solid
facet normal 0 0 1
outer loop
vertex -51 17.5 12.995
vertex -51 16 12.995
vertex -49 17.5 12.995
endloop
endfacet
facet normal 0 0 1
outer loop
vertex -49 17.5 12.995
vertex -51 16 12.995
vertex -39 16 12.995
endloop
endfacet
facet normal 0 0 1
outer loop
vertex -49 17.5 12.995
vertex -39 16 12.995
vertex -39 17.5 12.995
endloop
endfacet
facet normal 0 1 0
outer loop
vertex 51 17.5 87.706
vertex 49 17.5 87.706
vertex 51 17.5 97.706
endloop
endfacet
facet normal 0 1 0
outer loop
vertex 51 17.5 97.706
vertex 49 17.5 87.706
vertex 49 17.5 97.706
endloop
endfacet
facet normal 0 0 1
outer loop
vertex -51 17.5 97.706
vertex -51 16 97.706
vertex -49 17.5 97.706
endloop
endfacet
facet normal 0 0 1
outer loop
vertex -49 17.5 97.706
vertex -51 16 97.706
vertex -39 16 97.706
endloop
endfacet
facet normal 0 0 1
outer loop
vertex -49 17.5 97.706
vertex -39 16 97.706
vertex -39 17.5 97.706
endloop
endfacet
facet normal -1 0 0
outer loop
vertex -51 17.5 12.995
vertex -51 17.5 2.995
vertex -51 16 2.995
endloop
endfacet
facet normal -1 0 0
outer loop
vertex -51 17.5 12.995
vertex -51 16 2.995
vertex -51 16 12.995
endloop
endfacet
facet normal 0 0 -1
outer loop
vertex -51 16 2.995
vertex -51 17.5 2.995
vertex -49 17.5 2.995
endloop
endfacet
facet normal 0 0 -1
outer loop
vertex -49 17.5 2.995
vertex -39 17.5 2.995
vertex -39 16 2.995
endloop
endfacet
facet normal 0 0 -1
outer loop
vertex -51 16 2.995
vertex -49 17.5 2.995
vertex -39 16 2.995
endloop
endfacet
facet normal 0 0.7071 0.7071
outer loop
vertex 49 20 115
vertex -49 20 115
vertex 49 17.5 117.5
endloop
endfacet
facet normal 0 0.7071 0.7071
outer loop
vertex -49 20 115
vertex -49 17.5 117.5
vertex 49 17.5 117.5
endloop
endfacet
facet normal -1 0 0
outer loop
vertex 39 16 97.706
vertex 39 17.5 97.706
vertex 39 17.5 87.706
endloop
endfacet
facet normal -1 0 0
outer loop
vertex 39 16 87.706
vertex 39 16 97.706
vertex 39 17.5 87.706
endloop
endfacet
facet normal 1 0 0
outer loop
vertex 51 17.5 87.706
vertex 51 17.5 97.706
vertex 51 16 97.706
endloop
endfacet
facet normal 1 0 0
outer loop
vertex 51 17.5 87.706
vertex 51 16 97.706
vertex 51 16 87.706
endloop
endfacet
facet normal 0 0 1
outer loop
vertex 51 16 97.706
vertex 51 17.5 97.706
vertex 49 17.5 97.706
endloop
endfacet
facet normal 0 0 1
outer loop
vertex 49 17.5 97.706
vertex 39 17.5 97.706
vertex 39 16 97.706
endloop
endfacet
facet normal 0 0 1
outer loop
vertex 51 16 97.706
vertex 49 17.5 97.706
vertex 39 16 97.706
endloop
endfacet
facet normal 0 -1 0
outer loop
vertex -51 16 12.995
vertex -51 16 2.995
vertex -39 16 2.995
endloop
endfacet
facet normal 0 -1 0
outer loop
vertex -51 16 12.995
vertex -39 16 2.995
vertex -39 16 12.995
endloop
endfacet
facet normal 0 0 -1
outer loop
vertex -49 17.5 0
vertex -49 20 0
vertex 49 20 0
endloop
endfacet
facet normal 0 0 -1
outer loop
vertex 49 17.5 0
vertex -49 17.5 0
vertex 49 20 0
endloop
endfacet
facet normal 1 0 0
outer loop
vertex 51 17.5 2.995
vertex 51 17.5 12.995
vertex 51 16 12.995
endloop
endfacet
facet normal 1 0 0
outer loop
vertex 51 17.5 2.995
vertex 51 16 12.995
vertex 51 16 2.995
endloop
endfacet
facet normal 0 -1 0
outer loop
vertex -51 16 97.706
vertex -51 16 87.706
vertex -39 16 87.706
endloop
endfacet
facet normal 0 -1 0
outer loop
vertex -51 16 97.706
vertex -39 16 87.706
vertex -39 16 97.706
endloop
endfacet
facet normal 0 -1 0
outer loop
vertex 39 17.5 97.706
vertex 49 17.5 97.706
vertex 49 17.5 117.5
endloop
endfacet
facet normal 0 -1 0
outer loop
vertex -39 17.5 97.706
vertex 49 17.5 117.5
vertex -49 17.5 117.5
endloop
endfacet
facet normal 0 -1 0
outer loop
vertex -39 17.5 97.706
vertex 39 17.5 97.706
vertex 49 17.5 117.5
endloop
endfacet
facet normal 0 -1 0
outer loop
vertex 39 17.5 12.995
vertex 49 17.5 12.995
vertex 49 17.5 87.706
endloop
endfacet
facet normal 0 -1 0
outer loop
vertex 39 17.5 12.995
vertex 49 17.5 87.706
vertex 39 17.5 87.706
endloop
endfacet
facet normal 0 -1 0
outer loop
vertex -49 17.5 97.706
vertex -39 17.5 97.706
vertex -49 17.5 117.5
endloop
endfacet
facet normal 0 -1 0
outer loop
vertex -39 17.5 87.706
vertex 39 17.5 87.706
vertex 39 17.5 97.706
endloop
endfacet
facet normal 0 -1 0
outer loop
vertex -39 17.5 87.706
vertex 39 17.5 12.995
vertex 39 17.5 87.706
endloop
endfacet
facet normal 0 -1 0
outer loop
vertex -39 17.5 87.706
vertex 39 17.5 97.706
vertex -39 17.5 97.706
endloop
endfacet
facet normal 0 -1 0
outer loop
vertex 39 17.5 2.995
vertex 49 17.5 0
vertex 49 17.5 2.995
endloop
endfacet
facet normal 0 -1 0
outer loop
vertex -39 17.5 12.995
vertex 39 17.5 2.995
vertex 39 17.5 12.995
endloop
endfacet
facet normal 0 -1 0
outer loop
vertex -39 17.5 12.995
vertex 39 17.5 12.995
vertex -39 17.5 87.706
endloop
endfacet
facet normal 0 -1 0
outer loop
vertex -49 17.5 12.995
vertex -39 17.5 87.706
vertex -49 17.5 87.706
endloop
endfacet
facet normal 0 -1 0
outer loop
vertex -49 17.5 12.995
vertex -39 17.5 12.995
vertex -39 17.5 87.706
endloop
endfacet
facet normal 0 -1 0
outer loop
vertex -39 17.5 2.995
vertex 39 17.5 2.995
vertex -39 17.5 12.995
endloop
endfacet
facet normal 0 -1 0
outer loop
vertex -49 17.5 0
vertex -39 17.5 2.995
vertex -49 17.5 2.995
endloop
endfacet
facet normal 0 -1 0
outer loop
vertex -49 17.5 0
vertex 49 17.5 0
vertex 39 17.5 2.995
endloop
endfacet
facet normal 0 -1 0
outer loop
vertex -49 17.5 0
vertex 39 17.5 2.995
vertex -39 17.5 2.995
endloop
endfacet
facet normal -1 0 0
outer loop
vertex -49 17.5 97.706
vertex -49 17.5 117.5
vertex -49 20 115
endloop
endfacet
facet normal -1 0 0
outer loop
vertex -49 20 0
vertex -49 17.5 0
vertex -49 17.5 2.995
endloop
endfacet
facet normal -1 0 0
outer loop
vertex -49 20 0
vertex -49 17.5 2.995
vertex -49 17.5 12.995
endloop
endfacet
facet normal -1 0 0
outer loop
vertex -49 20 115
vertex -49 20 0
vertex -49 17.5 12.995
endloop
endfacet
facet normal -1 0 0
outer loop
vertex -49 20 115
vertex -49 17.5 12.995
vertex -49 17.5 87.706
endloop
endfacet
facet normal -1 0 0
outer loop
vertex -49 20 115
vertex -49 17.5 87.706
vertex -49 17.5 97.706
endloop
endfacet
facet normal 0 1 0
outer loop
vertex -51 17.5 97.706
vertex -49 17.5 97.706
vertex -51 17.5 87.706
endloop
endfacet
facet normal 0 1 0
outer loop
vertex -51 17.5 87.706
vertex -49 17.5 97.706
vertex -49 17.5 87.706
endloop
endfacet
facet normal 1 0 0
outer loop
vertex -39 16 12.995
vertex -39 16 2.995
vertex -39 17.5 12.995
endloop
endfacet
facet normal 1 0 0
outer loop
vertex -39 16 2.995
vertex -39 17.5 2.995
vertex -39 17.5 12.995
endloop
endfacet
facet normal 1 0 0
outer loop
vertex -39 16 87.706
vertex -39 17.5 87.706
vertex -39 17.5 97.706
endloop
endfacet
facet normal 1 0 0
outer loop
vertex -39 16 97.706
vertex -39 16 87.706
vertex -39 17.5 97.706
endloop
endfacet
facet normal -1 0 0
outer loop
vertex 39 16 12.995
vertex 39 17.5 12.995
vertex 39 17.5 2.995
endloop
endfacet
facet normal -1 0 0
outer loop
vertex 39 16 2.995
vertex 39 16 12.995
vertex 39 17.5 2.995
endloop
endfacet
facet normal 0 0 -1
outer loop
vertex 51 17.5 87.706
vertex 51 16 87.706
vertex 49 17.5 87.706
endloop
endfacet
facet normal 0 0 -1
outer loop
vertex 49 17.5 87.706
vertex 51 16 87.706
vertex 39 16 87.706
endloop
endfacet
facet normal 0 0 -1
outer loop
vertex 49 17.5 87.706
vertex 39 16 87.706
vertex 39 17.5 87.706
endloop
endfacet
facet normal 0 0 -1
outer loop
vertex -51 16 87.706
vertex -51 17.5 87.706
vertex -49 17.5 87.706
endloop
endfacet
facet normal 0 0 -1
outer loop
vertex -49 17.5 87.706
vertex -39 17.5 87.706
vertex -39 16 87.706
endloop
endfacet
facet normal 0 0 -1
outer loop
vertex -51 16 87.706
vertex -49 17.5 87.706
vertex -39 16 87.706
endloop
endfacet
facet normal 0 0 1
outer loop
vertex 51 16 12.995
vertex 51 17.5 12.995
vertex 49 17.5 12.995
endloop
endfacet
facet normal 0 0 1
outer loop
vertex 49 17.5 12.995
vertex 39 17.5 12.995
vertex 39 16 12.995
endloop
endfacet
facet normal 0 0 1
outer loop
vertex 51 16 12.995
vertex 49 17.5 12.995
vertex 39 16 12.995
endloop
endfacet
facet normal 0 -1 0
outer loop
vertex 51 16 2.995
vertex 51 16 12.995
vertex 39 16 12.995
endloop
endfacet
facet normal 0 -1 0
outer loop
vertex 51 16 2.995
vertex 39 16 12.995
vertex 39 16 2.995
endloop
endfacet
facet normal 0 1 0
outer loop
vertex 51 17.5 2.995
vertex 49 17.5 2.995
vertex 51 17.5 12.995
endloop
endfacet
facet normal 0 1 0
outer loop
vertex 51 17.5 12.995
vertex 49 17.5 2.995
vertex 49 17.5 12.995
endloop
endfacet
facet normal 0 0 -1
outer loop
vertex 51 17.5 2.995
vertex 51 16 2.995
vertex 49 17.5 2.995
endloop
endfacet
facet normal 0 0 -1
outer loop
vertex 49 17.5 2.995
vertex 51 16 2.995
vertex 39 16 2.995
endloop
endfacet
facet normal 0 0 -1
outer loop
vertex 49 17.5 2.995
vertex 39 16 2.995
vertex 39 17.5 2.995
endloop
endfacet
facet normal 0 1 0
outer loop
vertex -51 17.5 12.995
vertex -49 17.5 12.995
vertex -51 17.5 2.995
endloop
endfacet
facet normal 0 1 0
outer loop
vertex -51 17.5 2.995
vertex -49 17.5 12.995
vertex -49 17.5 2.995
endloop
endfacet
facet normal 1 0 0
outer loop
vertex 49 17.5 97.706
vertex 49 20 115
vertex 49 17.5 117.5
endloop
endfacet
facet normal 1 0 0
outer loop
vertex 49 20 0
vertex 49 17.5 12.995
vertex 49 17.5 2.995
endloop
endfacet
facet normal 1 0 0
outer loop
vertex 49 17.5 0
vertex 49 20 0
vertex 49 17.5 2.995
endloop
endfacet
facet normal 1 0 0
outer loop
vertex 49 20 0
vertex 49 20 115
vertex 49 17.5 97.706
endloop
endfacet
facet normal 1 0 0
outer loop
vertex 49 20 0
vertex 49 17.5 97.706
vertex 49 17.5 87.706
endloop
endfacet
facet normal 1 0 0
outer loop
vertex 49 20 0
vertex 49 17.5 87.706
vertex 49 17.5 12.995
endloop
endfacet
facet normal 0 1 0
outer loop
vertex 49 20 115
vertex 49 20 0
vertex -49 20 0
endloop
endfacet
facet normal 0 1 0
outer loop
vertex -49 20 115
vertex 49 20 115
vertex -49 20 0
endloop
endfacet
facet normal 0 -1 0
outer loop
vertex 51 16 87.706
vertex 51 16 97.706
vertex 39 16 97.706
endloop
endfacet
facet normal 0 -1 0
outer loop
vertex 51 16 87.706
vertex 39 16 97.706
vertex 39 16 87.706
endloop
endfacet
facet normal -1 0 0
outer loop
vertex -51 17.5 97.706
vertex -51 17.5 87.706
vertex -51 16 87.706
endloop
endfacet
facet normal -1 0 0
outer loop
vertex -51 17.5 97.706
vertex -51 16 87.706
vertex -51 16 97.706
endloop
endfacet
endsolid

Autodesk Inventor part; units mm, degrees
ref_plane "YZ Plane" through (0, 0, 0) normal (1, 0, 0) x (0, 1, 0)
ref_plane "XZ Plane" through (0, 0, 0) normal (0, 1, 0) x (-1, 0, 0)
ref_plane "XY Plane" through (0, 0, 0) normal (0, 0, 1) x (1, 0, 0)
sketch "Sketch1" plane through (0, 0, 0) normal (0, 0, 1) x (1, 0, 0)
  line L0 (-52.5, -20) -> (52.5, -20)
  line L1 (52.5, 20) -> (-52.5, 20)
  line L2 (-52.5, -20) -> (52.5, 20) construction
  line L3 (52.5, -20) -> (-52.5, 20) construction
  line L4 (-50, 17.5) -> (50, 17.5)
  line L5 (50, -17.5) -> (-50, -17.5)
  line L6 (-50, 17.5) -> (50, -17.5) construction
  line L7 (50, 17.5) -> (-50, -17.5) construction
  line L8 (60.5, 0) -> (60.5, 8)
  line L9 (60.5, 8) -> (52.5, 20)
  line L10 (60.5, 0) -> (60.5, -8)
  line L11 (60.5, -8) -> (52.5, -20)
  line L12 (50, -17.5) -> (56.5426, -7.6861)
  line L13 (56.5426, -7.6861) -> (56.5426, 7.6861)
  line L14 (56.5426, 7.6861) -> (50, 17.5)
  line L15 (0, 0) -> (0, 38.4543) construction
  line L16 (-60.5, 0) -> (-60.5, 8)
  line L17 (-60.5, 8) -> (-52.5, 20)
  line L18 (-60.5, 0) -> (-60.5, -8)
  line L19 (-60.5, -8) -> (-52.5, -20)
  line L20 (-50, -17.5) -> (-56.5426, -7.6861)
  line L21 (-56.5426, -7.6861) -> (-56.5426, 7.6861)
  line L22 (-56.5426, 7.6861) -> (-50, 17.5)
  dimension "d0" = 105
  dimension "d1" = 40
  dimension "d2" = 100
  dimension "d3" = 35
  dimension "d5" = 8
  dimension "d6" = 8
extrude "Extrusion1" add sketch "Sketch1" along normal blind 120
sketch "Sketch2" plane through (0, 0, 120) normal (0, 0, 1) x (1, 0, 0)
  line L0 (-56.5426, 7.6861) -> (-50, 17.5) projected
  line L1 (-50, 17.5) -> (50, 17.5) projected
  line L2 (50, 17.5) -> (56.5426, 7.6861) projected
  line L3 (56.5426, 7.6861) -> (56.5426, -7.6861) projected
  line L4 (56.5426, -7.6861) -> (50, -17.5) projected
  line L5 (50, -17.5) -> (-50, -17.5) projected
  line L6 (-50, -17.5) -> (-56.5426, -7.6861) projected
  line L7 (-56.5426, -7.6861) -> (-56.5426, 7.6861) projected
  point P0 (0, 0)
extrude "Extrusion2" add sketch "Sketch2" against normal blind 2.5
sketch "Sketch3" plane through (0, 0, 0) normal (0, 0, -1) x (-1, 0, 0)
  point P0 (0, 0)
fillet "Fillet1" radius 1 2 edges at (0, -17.5, 117.5) (0, 17.5, 117.5)
chamfer "Chamfer1" distance 5 angle 45 6 edges at (0, 20, 120) (-56.5, 14, 120) (-56.5, -14, 120) (0, -20, 120) (56.5, 14, 120) (56.5, -14, 120)
sketch "Sketch4" plane through (-52.5, -20, 0) normal (0, -1, 0) x (1, 0, 0)
  point P0 (52.5, 0)
sketch "Sketch5" plane through (0, 0, 0) normal (0, 0, -1) x (-1, 0, 0)
  line L0 (-50, 17.5) -> (50, 17.5) projected
  line L1 (-50, 17.5) -> (-50, 24.1033)
  line L2 (-50, 24.1033) -> (-71.4575, 13.1576)
  line L3 (-71.4575, 13.1576) -> (-66.6293, -23.8647)
  line L4 (-66.6293, -23.8647) -> (1.9313, -29.9815)
  line L5 (1.9313, -29.9815) -> (78.5389, -23.8647)
  line L6 (78.5389, -23.8647) -> (75.9786, 8.2013)
  line L7 (75.9786, 8.2013) -> (50, 28.9973)
  line L8 (50, 28.9973) -> (50, 17.5)
  point P0 (0, 0)
extrude "Extrusion3" cut sketch "Sketch5" against normal blind 120
sketch "Sketch6" plane through (50, 17.5, 0) normal (1, 0, 0) x (0, 0, -1)
  point P0 (0, -17.5)
sketch "Sketch7" plane through (0, 0, 0) normal (0, 0, -1) x (-1, 0, 0)
  line L0 (-50, 20) -> (50, 20) construction
  line L1 (0, 20) -> (48, 20) construction
  point P0 (0, 0)
  dimension "d17" = 48
sketch "Sketch8" plane through (0, 0, 0) normal (0, 0, -1) x (-1, 0, 0)
  line L0 (49, 24.3422) -> (51, 24.3422)
  line L1 (51, 24.3422) -> (51, 15.6578)
  line L2 (51, 15.6578) -> (49, 15.6578)
  line L3 (49, 15.6578) -> (49, 24.3422)
  line L4 (-50, 20) -> (50, 20) projected
  line L5 (49, 24.3422) -> (51, 15.6578) construction
  line L6 (51, 24.3422) -> (49, 15.6578) construction
  point P0 (0, 0)
  dimension "d18" = 2
extrude "Extrusion4" cut sketch "Sketch8" against normal blind 120
ref_plane "Work Plane1" through (0, 20, 0) normal (-1, 0, 0) x (0, -1, 0)
mirror "Mirror1" about plane through (0, 20, 0) normal (-1, 0, 0) of "Extrusion4"
sketch "Sketch9" plane through (49, 17.5, 0) normal (1, 0, 0) x (0, 0, -1)
  line L0 (-2.9947, 0) -> (-12.9947, 0)
  line L1 (-12.9947, 0) -> (-12.9947, -1.5)
  line L2 (-12.9947, -1.5) -> (-2.9947, -1.5)
  line L3 (-2.9947, -1.5) -> (-2.9947, 0)
  line L4 (-115, 2.5) -> (-100, 2.5)
  line L5 (-97.7055, -1.5) -> (-87.7055, -1.5)
  line L6 (-87.7055, -1.5) -> (-87.7055, 0)
  line L7 (-87.7055, 0) -> (-97.7055, 0)
  line L8 (-97.7055, 0) -> (-97.7055, -1.5)
  point P0 (0, -17.5)
  point P1 (0, 2.5)
  dimension "d21" = 10
  dimension "d22" = 1.5
  dimension "d23" = 15
  dimension "d24" = 10
extrude "Extrusion5" add sketch "Sketch9" along normal blind 2 and the other way blind 10
mirror "Mirror2" about plane through (0, 20, 0) normal (-1, 0, 0) of "Extrusion5"
properties part number "Frame2"
